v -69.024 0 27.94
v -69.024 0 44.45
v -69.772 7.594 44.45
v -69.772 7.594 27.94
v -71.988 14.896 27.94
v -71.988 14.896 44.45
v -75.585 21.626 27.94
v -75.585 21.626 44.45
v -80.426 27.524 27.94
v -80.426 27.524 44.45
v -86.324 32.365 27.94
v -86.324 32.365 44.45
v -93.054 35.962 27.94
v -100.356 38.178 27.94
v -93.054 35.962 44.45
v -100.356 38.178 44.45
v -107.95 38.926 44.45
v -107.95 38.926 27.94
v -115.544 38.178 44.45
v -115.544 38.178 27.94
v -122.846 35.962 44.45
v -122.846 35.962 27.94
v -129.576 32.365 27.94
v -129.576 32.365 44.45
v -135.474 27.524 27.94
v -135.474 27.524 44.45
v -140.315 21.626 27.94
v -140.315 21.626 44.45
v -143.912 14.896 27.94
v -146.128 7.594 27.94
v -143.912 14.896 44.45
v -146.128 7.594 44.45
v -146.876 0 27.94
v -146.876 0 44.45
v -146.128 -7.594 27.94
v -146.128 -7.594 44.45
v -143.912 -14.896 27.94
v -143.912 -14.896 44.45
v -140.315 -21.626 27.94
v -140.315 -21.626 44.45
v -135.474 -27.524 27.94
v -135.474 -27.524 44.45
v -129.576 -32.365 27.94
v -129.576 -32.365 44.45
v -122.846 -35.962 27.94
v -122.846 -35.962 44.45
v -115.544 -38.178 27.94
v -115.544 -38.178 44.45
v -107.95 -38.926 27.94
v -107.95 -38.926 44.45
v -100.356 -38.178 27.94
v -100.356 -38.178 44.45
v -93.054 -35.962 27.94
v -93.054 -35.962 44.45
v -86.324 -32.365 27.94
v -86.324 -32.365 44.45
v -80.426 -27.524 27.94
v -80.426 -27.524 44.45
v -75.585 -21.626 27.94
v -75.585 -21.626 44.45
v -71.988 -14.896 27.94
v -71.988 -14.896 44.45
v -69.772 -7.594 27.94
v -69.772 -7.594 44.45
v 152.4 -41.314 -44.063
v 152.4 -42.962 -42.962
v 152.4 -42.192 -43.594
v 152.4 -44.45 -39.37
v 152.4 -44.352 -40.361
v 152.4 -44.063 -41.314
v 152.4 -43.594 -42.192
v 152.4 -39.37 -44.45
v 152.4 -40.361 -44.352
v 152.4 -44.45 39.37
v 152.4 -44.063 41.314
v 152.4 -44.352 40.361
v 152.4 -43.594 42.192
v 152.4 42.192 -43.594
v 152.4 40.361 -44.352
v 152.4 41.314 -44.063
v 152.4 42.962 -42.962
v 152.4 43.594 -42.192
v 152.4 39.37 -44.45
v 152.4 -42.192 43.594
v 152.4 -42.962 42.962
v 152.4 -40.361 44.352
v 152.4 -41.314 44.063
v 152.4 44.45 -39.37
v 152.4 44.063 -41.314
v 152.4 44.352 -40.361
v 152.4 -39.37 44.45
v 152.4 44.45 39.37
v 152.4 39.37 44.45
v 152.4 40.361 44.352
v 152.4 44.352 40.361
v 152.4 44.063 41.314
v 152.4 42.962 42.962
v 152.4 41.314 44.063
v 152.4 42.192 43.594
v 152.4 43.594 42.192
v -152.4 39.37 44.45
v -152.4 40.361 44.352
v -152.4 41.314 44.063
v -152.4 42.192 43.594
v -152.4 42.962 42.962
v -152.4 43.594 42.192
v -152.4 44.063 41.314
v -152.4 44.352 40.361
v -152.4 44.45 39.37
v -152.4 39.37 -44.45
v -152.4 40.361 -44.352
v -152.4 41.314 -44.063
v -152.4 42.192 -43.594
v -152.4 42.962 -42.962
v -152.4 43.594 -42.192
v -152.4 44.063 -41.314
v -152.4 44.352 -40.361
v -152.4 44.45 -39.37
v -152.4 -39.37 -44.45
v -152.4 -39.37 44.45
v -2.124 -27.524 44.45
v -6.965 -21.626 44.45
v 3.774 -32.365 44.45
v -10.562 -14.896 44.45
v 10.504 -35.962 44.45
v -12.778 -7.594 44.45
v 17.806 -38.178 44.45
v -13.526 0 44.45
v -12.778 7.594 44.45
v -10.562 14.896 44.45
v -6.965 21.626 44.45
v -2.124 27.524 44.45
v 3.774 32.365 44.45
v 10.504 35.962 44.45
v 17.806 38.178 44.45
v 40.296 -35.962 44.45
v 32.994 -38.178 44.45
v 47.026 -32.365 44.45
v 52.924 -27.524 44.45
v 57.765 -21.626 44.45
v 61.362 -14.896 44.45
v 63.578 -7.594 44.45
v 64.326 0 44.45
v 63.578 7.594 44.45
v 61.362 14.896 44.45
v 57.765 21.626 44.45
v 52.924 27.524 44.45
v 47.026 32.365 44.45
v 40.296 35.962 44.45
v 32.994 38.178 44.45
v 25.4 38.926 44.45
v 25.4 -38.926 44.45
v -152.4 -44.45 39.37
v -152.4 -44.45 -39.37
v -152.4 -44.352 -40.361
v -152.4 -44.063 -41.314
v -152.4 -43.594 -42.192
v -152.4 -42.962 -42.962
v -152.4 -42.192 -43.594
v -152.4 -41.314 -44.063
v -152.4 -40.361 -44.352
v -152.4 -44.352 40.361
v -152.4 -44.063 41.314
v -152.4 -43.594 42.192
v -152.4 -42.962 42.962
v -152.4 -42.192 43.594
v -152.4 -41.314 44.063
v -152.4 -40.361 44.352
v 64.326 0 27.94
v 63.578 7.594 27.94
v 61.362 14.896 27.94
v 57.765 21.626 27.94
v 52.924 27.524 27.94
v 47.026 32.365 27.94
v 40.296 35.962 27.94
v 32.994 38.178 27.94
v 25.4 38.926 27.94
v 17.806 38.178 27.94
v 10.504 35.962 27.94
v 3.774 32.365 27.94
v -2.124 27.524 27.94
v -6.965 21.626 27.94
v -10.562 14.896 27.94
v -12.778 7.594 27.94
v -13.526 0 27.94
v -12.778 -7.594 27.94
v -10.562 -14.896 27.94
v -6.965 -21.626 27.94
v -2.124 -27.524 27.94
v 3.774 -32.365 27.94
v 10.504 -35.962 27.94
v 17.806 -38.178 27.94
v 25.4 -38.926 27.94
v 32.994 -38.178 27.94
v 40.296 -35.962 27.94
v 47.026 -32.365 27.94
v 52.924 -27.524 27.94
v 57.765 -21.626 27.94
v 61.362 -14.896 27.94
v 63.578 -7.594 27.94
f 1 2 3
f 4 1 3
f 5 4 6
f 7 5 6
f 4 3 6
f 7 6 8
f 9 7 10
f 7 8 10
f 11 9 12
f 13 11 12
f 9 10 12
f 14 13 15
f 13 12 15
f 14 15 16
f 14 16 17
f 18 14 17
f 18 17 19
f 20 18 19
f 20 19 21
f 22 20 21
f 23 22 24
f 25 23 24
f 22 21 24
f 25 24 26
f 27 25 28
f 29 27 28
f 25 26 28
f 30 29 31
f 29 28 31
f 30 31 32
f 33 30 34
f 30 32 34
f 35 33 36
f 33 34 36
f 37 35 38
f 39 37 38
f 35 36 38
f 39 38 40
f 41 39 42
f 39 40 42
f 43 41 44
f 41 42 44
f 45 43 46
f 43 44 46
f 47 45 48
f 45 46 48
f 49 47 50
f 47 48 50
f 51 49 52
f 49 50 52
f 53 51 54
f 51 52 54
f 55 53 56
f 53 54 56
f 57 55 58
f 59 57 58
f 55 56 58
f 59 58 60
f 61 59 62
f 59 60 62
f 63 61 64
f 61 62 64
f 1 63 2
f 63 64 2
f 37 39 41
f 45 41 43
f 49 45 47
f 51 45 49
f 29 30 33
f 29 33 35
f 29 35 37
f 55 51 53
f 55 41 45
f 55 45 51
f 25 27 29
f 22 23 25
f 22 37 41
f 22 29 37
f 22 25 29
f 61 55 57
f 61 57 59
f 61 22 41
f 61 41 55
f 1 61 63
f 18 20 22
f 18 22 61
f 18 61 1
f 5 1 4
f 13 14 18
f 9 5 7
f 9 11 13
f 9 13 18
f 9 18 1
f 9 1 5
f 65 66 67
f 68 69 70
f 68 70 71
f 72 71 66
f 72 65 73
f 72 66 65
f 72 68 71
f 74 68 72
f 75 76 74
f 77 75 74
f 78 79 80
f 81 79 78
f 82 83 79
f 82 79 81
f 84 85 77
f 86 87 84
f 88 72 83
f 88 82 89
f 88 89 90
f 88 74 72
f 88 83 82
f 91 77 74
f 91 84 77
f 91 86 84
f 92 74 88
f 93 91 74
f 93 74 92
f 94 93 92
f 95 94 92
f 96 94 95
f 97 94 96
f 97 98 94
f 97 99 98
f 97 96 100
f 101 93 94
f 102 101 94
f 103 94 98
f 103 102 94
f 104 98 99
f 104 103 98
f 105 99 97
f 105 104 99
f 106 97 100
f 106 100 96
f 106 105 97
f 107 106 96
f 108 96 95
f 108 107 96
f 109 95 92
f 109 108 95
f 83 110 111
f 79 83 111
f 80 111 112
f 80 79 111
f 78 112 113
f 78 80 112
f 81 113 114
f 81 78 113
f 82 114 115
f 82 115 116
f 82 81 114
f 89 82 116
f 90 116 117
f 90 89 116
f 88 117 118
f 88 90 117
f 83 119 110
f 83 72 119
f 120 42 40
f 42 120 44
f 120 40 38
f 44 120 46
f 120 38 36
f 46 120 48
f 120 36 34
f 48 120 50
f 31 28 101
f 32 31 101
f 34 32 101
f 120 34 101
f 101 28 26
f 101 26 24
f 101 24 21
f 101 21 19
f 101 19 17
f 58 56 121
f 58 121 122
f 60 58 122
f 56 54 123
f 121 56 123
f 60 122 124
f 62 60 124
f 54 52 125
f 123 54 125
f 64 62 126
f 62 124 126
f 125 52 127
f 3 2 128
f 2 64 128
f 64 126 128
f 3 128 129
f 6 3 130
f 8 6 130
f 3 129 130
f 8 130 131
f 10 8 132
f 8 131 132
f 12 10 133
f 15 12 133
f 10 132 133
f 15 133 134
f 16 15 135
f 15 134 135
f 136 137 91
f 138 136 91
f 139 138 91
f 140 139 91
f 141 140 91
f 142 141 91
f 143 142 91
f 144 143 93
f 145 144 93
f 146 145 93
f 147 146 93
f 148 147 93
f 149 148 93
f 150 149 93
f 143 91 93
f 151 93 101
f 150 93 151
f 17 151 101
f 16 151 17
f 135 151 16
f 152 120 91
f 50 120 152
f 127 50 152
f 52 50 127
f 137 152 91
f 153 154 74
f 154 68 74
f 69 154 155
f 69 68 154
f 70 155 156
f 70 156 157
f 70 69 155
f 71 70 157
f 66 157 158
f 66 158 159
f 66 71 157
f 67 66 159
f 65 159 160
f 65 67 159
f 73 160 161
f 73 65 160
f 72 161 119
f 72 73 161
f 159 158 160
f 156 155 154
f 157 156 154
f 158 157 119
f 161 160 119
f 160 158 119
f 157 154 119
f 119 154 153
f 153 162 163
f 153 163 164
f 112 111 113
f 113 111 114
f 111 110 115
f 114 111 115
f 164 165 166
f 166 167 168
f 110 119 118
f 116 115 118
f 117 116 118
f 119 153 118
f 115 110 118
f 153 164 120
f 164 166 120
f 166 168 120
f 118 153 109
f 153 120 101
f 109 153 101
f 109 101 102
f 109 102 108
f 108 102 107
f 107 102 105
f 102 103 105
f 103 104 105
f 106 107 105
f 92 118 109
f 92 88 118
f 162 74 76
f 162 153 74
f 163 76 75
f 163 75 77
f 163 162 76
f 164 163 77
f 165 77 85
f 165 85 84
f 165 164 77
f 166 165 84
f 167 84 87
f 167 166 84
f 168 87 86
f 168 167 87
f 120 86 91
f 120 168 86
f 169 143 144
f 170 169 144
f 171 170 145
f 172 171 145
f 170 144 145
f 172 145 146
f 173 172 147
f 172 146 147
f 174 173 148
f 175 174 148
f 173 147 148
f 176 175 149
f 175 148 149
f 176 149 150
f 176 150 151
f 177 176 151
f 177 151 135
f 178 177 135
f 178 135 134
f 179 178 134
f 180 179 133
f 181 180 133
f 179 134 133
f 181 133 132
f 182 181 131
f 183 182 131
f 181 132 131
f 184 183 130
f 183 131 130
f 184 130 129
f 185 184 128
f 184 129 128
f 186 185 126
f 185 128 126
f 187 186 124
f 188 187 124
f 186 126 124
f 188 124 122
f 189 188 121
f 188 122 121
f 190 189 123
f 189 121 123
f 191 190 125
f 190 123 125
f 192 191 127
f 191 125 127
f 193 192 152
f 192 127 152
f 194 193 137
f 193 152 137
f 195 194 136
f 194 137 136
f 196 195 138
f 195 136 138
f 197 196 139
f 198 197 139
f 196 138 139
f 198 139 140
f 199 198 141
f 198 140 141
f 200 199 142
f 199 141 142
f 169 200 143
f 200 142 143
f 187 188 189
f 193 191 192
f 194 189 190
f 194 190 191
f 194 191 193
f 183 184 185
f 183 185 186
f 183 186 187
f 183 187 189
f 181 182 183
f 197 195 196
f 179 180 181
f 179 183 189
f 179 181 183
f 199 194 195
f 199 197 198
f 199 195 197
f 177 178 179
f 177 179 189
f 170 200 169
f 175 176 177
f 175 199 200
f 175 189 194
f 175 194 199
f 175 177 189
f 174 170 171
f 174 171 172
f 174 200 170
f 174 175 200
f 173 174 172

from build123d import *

# Parameters (mm, degrees)
F0_W          = 88.9
F0_H          = 88.9
F1_DEPTH      = 152.4
F1_DEPTH_BACK = 152.4
F2_R          = 38.9255
F3_DEPTH      = 16.51
F4_R          = 5.08


with BuildPart() as f1:
    # F0 (on Right) → F1 (new body, two sides)
    with BuildSketch(Plane.YZ) as f1_sk:
        Rectangle(F0_W, F0_H)
    extrude(amount=F1_DEPTH)
    extrude(f1_sk.sketch, amount=-F1_DEPTH_BACK)

    # F2 (on face) → F3 (cut)
    with BuildSketch(Plane.XY.offset(44.45)):
        with Locations((-107.95, 0)):
            Circle(F2_R)
        with Locations((25.4, 0)):
            Circle(F2_R)
    extrude(amount=-F3_DEPTH, mode=Mode.SUBTRACT)

    # F4
    f4_edges = [f1.edges().sort_by_distance(p)[0] for p in [
        (0, -44.45, 44.45),
        (0, 44.45, 44.45),
        (0, -44.45, -44.45),
        (0, 44.45, -44.45),
    ]]
    fillet(f4_edges, radius=F4_R)


solid = f1.part
